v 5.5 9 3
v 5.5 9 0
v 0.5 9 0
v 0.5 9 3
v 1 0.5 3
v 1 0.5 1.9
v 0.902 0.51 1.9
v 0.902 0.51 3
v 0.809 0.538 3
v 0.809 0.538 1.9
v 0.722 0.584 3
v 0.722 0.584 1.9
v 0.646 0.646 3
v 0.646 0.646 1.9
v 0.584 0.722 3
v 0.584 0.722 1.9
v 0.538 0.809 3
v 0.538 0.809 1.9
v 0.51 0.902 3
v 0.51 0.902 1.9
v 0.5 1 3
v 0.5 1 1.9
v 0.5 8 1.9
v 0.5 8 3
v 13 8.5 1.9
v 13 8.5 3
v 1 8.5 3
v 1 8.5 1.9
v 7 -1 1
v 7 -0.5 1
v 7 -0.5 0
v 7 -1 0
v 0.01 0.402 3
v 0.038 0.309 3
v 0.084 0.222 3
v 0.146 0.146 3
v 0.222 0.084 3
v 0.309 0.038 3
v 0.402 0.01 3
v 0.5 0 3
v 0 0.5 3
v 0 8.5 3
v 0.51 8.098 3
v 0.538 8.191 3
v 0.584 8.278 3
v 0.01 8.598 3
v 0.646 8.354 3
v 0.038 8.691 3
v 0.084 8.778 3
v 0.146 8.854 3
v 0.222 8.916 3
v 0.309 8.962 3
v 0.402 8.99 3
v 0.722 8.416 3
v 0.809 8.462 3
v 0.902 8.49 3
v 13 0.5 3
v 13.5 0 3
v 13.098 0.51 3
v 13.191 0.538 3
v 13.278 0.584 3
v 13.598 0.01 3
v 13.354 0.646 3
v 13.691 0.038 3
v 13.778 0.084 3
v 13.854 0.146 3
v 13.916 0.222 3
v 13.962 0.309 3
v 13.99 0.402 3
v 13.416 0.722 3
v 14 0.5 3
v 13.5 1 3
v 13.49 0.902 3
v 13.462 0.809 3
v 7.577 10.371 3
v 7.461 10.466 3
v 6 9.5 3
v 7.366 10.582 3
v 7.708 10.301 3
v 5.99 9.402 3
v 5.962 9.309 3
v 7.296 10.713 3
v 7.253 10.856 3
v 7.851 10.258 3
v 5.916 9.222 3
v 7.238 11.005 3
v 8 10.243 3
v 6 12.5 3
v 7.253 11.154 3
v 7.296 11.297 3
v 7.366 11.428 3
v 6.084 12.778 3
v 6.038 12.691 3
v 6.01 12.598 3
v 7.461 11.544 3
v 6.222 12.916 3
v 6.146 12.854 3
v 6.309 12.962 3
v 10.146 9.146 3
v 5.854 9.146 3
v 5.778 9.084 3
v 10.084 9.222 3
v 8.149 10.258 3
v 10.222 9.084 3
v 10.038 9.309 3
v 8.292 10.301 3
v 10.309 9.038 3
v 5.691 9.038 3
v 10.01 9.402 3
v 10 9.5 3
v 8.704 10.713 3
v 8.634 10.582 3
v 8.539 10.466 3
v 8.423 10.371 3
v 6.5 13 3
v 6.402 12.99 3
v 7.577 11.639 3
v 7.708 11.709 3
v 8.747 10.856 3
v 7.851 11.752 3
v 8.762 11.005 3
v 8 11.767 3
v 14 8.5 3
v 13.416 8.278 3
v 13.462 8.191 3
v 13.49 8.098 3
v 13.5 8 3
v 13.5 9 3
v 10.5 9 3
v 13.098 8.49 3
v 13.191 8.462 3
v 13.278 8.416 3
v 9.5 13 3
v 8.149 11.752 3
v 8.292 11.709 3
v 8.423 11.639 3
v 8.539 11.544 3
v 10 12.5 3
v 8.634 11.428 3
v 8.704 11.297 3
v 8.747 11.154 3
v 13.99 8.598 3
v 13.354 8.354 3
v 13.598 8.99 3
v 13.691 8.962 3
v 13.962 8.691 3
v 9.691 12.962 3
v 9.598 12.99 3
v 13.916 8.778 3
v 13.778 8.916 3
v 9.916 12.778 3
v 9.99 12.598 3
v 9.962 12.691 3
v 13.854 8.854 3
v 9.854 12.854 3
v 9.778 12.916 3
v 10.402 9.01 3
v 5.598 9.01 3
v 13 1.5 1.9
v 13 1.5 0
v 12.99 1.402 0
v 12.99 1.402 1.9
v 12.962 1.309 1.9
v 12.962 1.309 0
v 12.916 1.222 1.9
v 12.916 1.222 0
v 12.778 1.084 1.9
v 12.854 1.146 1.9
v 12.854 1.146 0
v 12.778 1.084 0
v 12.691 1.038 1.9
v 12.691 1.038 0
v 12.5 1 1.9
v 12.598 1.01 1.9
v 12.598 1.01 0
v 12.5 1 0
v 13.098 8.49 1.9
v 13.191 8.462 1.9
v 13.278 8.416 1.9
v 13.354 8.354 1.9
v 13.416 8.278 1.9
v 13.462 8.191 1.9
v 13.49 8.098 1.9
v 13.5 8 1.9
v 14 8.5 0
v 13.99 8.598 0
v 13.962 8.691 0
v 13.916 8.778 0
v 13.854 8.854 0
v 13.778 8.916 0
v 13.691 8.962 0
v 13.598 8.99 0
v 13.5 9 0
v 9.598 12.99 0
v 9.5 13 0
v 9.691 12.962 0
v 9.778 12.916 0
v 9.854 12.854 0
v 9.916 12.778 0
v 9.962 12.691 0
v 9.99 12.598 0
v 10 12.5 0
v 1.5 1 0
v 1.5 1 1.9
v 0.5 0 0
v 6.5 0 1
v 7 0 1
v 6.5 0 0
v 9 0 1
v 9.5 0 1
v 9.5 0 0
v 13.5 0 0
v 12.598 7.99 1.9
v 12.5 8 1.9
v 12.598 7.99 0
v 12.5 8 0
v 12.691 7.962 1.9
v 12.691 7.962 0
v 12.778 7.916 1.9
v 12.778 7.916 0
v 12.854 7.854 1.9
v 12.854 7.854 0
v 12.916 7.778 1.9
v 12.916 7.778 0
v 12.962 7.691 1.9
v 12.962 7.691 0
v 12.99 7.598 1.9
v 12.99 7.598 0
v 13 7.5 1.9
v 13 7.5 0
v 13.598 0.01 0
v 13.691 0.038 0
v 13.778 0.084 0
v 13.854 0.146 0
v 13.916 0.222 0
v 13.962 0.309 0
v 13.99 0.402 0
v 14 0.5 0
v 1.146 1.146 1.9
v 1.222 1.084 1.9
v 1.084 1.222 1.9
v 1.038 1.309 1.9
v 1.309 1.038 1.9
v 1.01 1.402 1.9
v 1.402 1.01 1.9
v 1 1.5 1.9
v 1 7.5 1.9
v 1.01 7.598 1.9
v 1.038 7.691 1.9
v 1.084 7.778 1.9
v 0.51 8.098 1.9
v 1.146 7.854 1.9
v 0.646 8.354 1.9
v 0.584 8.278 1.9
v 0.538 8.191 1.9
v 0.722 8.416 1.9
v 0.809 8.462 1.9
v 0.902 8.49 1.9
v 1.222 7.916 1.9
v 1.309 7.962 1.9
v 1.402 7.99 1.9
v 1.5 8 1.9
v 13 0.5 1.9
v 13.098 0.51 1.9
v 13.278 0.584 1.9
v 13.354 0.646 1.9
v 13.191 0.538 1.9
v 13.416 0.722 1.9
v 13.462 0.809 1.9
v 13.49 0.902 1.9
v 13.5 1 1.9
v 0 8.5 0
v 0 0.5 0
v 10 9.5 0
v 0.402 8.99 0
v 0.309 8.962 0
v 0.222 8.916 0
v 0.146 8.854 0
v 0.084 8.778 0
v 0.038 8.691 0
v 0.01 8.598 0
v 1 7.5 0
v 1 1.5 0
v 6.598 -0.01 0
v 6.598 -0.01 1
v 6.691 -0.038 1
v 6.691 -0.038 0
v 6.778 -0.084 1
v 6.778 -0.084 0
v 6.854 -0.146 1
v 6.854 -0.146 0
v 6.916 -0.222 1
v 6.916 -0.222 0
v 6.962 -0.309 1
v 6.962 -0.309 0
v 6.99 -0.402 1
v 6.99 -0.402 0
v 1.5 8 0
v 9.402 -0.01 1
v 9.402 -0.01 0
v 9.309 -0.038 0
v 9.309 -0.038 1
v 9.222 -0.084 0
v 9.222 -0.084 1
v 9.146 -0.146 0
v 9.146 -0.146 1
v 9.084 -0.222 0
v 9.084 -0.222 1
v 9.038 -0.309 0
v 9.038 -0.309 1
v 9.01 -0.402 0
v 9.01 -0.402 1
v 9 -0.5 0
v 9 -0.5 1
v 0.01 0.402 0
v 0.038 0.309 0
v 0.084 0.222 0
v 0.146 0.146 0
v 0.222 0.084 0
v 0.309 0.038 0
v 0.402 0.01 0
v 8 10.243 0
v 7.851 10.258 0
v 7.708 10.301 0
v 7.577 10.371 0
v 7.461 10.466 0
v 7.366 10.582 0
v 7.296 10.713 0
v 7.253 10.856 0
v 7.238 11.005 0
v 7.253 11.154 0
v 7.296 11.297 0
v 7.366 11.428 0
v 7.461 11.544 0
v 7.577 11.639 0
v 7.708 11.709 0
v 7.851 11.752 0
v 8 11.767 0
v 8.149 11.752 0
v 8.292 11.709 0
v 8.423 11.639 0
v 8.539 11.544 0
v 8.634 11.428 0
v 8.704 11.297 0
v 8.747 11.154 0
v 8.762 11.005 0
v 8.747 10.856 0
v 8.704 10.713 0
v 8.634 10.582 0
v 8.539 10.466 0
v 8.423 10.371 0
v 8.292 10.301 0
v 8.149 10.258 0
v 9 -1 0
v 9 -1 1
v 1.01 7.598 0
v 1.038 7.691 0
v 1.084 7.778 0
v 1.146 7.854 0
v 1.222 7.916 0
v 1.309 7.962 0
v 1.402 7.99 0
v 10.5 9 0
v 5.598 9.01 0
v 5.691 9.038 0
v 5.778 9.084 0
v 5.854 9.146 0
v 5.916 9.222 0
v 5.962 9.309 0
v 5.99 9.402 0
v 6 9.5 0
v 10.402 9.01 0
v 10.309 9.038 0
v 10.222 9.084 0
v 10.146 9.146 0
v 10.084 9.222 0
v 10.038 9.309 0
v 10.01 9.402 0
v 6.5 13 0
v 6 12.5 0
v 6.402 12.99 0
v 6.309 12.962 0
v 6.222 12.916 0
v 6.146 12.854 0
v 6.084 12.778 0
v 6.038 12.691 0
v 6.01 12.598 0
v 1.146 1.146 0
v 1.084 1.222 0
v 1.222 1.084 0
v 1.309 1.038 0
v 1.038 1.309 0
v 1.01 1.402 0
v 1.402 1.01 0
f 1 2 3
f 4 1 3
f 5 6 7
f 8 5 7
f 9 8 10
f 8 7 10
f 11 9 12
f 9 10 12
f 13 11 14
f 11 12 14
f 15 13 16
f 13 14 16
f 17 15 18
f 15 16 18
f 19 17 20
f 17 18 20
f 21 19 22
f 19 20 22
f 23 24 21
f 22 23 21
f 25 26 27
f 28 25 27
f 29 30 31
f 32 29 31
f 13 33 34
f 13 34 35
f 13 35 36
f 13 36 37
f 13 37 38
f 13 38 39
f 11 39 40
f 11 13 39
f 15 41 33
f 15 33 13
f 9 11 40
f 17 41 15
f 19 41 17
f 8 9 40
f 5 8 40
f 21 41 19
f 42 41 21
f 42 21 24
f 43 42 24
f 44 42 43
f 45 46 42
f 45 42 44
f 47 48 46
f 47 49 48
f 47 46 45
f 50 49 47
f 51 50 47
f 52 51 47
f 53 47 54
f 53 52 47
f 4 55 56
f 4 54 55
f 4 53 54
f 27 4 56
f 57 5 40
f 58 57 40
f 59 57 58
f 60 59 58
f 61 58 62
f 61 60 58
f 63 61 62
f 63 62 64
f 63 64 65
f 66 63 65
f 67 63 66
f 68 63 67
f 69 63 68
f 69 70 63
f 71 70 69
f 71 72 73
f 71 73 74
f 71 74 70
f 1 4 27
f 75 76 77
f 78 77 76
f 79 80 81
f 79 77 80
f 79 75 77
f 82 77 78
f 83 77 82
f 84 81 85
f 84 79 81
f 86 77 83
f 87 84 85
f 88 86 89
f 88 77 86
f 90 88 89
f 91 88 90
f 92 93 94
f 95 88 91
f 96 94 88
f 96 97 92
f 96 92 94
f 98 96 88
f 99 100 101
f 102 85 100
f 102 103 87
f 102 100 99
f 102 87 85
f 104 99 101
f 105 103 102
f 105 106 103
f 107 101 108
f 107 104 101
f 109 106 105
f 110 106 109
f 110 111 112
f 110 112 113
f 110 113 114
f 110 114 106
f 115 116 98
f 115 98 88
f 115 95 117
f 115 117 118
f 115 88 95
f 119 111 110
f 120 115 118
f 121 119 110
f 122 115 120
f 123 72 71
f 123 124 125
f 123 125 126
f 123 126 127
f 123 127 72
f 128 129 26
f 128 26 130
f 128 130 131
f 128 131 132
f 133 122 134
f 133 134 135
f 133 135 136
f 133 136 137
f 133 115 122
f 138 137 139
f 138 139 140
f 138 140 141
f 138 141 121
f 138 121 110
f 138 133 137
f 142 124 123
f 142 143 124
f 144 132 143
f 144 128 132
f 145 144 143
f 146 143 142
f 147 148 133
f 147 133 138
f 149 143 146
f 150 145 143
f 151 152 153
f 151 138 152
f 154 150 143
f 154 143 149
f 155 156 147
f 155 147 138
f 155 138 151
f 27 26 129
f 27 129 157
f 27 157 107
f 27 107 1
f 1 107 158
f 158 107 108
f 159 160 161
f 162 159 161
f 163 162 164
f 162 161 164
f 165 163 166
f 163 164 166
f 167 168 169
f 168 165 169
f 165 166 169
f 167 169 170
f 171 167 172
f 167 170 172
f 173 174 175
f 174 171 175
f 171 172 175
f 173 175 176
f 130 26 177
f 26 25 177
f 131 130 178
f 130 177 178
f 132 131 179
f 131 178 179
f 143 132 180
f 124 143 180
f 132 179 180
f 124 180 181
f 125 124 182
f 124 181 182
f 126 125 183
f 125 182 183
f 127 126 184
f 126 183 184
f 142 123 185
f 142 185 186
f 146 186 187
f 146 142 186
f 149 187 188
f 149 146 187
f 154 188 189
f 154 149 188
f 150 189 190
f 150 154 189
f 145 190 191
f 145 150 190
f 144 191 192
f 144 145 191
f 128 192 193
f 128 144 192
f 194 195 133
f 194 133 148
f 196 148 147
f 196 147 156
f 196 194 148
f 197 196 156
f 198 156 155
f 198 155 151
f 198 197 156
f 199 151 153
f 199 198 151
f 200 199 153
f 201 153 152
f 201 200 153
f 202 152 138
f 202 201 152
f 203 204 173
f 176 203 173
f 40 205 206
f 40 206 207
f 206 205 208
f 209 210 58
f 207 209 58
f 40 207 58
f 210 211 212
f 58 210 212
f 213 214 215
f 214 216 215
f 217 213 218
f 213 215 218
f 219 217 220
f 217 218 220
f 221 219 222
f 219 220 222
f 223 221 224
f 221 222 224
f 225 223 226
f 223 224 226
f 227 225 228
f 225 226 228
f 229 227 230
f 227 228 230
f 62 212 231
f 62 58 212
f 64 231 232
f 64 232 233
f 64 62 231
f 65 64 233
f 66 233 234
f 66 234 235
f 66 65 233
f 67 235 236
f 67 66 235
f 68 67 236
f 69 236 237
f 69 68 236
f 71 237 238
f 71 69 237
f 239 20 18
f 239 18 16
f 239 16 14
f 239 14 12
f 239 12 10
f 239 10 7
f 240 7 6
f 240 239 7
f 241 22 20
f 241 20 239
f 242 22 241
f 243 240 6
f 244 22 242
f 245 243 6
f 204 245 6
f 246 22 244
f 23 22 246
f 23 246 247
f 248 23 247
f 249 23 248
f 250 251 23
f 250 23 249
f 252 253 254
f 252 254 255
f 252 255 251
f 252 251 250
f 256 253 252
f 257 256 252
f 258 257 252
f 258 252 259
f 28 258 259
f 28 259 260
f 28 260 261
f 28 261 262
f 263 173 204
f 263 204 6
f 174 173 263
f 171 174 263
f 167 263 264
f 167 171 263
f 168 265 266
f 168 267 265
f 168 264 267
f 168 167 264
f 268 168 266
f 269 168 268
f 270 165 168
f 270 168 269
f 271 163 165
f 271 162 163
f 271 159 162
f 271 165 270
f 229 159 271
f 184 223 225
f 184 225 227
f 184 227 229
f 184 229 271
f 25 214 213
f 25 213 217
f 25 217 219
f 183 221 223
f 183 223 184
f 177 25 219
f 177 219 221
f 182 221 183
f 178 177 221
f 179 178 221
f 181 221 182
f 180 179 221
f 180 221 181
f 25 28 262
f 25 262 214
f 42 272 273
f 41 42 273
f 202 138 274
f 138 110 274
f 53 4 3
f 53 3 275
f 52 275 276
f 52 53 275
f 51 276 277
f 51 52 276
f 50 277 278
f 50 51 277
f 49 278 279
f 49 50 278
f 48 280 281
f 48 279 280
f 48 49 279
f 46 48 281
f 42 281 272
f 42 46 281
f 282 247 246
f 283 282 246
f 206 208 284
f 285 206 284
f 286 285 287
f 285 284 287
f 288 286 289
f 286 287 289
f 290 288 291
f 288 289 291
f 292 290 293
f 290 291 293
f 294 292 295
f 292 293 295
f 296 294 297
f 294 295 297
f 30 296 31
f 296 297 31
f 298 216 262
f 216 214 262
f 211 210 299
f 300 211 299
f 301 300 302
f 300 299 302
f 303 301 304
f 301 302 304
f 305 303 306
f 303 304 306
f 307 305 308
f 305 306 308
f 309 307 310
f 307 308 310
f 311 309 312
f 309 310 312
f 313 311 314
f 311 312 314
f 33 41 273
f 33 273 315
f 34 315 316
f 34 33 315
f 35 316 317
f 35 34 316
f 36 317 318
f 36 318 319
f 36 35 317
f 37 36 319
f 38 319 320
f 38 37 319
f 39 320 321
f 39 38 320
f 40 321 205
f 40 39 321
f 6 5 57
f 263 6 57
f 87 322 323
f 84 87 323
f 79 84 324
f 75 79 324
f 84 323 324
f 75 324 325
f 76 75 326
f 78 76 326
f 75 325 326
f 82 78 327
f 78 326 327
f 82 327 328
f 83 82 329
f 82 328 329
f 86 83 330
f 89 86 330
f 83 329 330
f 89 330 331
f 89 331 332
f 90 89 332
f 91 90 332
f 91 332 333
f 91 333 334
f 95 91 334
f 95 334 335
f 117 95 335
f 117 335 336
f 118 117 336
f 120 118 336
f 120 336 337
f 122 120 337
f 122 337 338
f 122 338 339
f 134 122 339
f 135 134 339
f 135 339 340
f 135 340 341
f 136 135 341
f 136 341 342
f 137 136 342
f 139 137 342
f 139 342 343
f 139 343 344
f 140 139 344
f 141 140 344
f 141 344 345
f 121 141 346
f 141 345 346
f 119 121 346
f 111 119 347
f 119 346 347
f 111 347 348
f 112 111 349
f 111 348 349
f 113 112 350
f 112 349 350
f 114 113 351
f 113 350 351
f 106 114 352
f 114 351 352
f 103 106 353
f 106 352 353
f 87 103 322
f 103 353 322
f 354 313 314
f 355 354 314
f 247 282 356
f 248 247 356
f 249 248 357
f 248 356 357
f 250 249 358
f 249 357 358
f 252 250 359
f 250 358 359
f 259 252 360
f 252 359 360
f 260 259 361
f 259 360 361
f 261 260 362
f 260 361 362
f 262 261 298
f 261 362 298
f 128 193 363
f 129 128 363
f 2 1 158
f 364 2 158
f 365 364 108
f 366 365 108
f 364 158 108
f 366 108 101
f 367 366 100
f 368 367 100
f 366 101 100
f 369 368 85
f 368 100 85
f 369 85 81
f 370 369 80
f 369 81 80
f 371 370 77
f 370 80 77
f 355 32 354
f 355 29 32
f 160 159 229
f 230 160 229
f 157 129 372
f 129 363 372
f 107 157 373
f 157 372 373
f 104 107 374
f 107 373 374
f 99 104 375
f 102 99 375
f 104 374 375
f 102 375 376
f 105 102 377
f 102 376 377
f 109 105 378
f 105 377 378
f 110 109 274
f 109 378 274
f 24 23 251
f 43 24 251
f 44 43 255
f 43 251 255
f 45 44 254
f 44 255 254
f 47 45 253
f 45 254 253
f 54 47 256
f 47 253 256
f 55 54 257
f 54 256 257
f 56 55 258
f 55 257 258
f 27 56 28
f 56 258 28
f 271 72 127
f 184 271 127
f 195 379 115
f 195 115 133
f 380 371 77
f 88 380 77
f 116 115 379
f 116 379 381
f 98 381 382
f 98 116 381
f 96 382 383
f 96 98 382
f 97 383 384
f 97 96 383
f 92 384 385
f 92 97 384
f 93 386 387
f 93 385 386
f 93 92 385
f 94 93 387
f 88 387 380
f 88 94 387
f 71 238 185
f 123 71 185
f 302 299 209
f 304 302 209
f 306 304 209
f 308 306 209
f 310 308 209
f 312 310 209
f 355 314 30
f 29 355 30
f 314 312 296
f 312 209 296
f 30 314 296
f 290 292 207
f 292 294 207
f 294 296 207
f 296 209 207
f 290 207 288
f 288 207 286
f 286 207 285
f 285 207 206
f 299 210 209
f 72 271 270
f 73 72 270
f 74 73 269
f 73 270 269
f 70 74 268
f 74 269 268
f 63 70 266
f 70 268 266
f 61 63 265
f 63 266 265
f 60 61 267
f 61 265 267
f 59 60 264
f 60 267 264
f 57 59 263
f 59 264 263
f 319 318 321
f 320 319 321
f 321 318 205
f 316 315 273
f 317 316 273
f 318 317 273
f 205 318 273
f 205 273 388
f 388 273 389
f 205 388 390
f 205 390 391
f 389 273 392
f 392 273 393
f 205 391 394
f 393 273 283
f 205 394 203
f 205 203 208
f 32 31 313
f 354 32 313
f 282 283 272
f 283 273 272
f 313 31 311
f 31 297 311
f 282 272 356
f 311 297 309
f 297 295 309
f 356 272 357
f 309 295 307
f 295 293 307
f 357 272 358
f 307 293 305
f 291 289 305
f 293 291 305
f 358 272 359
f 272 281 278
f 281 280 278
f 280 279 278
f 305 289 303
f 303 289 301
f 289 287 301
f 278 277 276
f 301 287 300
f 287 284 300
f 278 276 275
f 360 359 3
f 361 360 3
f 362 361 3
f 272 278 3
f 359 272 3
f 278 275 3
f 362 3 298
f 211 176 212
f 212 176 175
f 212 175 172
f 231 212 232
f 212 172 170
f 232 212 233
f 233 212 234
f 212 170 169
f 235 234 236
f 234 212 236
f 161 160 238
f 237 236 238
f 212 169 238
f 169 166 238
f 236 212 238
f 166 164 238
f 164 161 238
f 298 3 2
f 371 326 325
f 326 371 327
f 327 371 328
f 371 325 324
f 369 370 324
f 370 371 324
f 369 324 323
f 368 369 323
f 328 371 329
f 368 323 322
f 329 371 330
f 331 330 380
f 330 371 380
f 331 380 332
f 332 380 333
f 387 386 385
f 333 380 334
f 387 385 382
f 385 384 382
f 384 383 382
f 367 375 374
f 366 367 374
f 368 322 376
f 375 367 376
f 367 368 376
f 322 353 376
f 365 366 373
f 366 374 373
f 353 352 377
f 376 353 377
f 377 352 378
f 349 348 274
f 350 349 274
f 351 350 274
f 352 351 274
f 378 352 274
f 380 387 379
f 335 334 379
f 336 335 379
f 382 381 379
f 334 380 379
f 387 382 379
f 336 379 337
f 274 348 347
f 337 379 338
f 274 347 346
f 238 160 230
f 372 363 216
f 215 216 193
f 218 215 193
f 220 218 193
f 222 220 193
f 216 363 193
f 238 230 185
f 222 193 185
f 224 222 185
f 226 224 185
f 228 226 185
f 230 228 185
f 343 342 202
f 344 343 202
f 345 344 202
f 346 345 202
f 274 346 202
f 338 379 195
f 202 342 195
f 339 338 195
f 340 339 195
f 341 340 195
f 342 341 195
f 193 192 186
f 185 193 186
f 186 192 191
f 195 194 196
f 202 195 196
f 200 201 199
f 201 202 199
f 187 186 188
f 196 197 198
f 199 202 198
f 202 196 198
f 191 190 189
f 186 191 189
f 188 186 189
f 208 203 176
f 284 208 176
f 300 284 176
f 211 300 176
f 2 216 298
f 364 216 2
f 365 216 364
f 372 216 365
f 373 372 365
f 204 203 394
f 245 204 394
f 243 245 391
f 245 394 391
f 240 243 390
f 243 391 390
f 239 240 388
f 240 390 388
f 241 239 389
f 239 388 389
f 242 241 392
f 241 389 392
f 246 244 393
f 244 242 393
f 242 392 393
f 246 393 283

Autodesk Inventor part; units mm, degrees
ref_plane "YZ Plane" through (0, 0, 0) normal (1, 0, 0) x (0, 1, 0)
ref_plane "XZ Plane" through (0, 0, 0) normal (0, 1, 0) x (-1, 0, 0)
ref_plane "XY Plane" through (0, 0, 0) normal (0, 0, 1) x (1, 0, 0)
sketch "Sketch1" plane through (0, 0, 0) normal (0, 0, 1) x (1, 0, 0)
  line L0 (0, 0) -> (14, 0)
  line L1 (14, 0) -> (14, 9)
  line L2 (14, 9) -> (0, 9)
  line L3 (0, 9) -> (0, 0)
  dimension "d0" = 14
  dimension "d1" = 9
extrude "Extrusion1" add sketch "Sketch1" along normal blind 3
sketch "Sketch2" plane through (0, 0, 3) normal (0, 0, 1) x (1, 0, 0)
  line L0 (1, 1) -> (13, 1)
  line L1 (13, 1) -> (13, 8)
  line L2 (13, 8) -> (1, 8)
  line L3 (1, 8) -> (1, 1)
  dimension "d4" = 12
  dimension "d5" = 7
extrude "Extrusion2" cut sketch "Sketch2" against normal through all
sketch "Sketch3" plane through (0, 9, 0) normal (0, 1, 0) x (1, 0, 0)
  line L0 (0, -3) -> (14, -3) projected
  line L1 (14, 0) -> (0, 0) projected
  line L2 (0, 0) -> (0, -3) projected
  line L3 (6, -3) -> (10, -3)
  line L4 (10, -3) -> (10, 0)
  line L5 (10, 0) -> (6, 0)
  line L6 (6, 0) -> (6, -3)
  dimension "d13" = 4
  dimension "d14" = 6
extrude "Extrusion3" add sketch "Sketch3" along normal blind 4 contours L6 L1 L4 L0
sketch "Sketch5" plane through (0, 0, 3) normal (0, 0, 1) x (1, 0, 0)
  line L0 (13, 8) -> (13, 1) projected
  line L1 (13, 1) -> (1, 1) projected
  line L2 (1, 1) -> (1, 8) projected
  line L3 (1, 8) -> (13, 8) projected
  line L4 (0.5, 8.5) -> (0.5, 0.5)
  line L5 (0.5, 0.5) -> (13.5, 0.5)
  line L6 (13.5, 0.5) -> (13.5, 8.5)
  line L7 (13.5, 8.5) -> (0.5, 8.5)
  point P0 (14, 1)
  dimension "d17" = 0.5
extrude "Extrusion4" cut sketch "Sketch5" against normal blind 1.1
sketch "Sketch6" plane through (0, 0, 3) normal (0, 0, 1) x (1, 0, 0)
  line L0 (10, 9) -> (10, 13) projected
  line L1 (10, 13) -> (6, 13) projected
  line L2 (6, 9) -> (6, 13) projected
  line L3 (6, 11) -> (10, 11) construction
  line L4 (8, 13) -> (8, 9) construction
  point P0 (8, 11.005)
hole "Hole1" at (8, 11.005, 3) direction (0, 0, -1) diameter 1.524 end through all
thread "Thread1" size "0-80 UNF" class "2B" standard "ANSI Unified Screw Threads" full length
sketch "Sketch7" plane through (0, 0, 0) normal (0, -1, 0) x (1, 0, 0)
  line L0 (0, 0) -> (0, 3) projected
  line L1 (0, 0) -> (14, 0) projected
  line L2 (7, 0) -> (9, 0)
  line L3 (9, 0) -> (9, 1)
  line L4 (9, 1) -> (7, 1)
  line L5 (7, 1) -> (7, 0)
  dimension "d29" = 2
  dimension "d30" = 1
  dimension "d31" = 7
extrude "Extrusion5" add sketch "Sketch7" along normal blind 1
fillet "Fillet1" radius 0.5 18 edges at (0.5, 0.5, 2.45) (1, 1, 0.95) (1, 8, 0.95) (0.5, 8.5, 2.45) (13, 8, 0.95) (13.5, 8.5, 2.45) (13, 1, 0.95) (13.5, 0.5, 2.45) (14, 0, 1.5) (9, 0, 0.5) (0, 0, 1.5) (7, 0, 0.5) (0, 9, 1.5) (6, 9, 1.5) (6, 13, 1.5) (10, 13, 1.5) (10, 9, 1.5) (14, 9, 1.5)
properties part number "base"
